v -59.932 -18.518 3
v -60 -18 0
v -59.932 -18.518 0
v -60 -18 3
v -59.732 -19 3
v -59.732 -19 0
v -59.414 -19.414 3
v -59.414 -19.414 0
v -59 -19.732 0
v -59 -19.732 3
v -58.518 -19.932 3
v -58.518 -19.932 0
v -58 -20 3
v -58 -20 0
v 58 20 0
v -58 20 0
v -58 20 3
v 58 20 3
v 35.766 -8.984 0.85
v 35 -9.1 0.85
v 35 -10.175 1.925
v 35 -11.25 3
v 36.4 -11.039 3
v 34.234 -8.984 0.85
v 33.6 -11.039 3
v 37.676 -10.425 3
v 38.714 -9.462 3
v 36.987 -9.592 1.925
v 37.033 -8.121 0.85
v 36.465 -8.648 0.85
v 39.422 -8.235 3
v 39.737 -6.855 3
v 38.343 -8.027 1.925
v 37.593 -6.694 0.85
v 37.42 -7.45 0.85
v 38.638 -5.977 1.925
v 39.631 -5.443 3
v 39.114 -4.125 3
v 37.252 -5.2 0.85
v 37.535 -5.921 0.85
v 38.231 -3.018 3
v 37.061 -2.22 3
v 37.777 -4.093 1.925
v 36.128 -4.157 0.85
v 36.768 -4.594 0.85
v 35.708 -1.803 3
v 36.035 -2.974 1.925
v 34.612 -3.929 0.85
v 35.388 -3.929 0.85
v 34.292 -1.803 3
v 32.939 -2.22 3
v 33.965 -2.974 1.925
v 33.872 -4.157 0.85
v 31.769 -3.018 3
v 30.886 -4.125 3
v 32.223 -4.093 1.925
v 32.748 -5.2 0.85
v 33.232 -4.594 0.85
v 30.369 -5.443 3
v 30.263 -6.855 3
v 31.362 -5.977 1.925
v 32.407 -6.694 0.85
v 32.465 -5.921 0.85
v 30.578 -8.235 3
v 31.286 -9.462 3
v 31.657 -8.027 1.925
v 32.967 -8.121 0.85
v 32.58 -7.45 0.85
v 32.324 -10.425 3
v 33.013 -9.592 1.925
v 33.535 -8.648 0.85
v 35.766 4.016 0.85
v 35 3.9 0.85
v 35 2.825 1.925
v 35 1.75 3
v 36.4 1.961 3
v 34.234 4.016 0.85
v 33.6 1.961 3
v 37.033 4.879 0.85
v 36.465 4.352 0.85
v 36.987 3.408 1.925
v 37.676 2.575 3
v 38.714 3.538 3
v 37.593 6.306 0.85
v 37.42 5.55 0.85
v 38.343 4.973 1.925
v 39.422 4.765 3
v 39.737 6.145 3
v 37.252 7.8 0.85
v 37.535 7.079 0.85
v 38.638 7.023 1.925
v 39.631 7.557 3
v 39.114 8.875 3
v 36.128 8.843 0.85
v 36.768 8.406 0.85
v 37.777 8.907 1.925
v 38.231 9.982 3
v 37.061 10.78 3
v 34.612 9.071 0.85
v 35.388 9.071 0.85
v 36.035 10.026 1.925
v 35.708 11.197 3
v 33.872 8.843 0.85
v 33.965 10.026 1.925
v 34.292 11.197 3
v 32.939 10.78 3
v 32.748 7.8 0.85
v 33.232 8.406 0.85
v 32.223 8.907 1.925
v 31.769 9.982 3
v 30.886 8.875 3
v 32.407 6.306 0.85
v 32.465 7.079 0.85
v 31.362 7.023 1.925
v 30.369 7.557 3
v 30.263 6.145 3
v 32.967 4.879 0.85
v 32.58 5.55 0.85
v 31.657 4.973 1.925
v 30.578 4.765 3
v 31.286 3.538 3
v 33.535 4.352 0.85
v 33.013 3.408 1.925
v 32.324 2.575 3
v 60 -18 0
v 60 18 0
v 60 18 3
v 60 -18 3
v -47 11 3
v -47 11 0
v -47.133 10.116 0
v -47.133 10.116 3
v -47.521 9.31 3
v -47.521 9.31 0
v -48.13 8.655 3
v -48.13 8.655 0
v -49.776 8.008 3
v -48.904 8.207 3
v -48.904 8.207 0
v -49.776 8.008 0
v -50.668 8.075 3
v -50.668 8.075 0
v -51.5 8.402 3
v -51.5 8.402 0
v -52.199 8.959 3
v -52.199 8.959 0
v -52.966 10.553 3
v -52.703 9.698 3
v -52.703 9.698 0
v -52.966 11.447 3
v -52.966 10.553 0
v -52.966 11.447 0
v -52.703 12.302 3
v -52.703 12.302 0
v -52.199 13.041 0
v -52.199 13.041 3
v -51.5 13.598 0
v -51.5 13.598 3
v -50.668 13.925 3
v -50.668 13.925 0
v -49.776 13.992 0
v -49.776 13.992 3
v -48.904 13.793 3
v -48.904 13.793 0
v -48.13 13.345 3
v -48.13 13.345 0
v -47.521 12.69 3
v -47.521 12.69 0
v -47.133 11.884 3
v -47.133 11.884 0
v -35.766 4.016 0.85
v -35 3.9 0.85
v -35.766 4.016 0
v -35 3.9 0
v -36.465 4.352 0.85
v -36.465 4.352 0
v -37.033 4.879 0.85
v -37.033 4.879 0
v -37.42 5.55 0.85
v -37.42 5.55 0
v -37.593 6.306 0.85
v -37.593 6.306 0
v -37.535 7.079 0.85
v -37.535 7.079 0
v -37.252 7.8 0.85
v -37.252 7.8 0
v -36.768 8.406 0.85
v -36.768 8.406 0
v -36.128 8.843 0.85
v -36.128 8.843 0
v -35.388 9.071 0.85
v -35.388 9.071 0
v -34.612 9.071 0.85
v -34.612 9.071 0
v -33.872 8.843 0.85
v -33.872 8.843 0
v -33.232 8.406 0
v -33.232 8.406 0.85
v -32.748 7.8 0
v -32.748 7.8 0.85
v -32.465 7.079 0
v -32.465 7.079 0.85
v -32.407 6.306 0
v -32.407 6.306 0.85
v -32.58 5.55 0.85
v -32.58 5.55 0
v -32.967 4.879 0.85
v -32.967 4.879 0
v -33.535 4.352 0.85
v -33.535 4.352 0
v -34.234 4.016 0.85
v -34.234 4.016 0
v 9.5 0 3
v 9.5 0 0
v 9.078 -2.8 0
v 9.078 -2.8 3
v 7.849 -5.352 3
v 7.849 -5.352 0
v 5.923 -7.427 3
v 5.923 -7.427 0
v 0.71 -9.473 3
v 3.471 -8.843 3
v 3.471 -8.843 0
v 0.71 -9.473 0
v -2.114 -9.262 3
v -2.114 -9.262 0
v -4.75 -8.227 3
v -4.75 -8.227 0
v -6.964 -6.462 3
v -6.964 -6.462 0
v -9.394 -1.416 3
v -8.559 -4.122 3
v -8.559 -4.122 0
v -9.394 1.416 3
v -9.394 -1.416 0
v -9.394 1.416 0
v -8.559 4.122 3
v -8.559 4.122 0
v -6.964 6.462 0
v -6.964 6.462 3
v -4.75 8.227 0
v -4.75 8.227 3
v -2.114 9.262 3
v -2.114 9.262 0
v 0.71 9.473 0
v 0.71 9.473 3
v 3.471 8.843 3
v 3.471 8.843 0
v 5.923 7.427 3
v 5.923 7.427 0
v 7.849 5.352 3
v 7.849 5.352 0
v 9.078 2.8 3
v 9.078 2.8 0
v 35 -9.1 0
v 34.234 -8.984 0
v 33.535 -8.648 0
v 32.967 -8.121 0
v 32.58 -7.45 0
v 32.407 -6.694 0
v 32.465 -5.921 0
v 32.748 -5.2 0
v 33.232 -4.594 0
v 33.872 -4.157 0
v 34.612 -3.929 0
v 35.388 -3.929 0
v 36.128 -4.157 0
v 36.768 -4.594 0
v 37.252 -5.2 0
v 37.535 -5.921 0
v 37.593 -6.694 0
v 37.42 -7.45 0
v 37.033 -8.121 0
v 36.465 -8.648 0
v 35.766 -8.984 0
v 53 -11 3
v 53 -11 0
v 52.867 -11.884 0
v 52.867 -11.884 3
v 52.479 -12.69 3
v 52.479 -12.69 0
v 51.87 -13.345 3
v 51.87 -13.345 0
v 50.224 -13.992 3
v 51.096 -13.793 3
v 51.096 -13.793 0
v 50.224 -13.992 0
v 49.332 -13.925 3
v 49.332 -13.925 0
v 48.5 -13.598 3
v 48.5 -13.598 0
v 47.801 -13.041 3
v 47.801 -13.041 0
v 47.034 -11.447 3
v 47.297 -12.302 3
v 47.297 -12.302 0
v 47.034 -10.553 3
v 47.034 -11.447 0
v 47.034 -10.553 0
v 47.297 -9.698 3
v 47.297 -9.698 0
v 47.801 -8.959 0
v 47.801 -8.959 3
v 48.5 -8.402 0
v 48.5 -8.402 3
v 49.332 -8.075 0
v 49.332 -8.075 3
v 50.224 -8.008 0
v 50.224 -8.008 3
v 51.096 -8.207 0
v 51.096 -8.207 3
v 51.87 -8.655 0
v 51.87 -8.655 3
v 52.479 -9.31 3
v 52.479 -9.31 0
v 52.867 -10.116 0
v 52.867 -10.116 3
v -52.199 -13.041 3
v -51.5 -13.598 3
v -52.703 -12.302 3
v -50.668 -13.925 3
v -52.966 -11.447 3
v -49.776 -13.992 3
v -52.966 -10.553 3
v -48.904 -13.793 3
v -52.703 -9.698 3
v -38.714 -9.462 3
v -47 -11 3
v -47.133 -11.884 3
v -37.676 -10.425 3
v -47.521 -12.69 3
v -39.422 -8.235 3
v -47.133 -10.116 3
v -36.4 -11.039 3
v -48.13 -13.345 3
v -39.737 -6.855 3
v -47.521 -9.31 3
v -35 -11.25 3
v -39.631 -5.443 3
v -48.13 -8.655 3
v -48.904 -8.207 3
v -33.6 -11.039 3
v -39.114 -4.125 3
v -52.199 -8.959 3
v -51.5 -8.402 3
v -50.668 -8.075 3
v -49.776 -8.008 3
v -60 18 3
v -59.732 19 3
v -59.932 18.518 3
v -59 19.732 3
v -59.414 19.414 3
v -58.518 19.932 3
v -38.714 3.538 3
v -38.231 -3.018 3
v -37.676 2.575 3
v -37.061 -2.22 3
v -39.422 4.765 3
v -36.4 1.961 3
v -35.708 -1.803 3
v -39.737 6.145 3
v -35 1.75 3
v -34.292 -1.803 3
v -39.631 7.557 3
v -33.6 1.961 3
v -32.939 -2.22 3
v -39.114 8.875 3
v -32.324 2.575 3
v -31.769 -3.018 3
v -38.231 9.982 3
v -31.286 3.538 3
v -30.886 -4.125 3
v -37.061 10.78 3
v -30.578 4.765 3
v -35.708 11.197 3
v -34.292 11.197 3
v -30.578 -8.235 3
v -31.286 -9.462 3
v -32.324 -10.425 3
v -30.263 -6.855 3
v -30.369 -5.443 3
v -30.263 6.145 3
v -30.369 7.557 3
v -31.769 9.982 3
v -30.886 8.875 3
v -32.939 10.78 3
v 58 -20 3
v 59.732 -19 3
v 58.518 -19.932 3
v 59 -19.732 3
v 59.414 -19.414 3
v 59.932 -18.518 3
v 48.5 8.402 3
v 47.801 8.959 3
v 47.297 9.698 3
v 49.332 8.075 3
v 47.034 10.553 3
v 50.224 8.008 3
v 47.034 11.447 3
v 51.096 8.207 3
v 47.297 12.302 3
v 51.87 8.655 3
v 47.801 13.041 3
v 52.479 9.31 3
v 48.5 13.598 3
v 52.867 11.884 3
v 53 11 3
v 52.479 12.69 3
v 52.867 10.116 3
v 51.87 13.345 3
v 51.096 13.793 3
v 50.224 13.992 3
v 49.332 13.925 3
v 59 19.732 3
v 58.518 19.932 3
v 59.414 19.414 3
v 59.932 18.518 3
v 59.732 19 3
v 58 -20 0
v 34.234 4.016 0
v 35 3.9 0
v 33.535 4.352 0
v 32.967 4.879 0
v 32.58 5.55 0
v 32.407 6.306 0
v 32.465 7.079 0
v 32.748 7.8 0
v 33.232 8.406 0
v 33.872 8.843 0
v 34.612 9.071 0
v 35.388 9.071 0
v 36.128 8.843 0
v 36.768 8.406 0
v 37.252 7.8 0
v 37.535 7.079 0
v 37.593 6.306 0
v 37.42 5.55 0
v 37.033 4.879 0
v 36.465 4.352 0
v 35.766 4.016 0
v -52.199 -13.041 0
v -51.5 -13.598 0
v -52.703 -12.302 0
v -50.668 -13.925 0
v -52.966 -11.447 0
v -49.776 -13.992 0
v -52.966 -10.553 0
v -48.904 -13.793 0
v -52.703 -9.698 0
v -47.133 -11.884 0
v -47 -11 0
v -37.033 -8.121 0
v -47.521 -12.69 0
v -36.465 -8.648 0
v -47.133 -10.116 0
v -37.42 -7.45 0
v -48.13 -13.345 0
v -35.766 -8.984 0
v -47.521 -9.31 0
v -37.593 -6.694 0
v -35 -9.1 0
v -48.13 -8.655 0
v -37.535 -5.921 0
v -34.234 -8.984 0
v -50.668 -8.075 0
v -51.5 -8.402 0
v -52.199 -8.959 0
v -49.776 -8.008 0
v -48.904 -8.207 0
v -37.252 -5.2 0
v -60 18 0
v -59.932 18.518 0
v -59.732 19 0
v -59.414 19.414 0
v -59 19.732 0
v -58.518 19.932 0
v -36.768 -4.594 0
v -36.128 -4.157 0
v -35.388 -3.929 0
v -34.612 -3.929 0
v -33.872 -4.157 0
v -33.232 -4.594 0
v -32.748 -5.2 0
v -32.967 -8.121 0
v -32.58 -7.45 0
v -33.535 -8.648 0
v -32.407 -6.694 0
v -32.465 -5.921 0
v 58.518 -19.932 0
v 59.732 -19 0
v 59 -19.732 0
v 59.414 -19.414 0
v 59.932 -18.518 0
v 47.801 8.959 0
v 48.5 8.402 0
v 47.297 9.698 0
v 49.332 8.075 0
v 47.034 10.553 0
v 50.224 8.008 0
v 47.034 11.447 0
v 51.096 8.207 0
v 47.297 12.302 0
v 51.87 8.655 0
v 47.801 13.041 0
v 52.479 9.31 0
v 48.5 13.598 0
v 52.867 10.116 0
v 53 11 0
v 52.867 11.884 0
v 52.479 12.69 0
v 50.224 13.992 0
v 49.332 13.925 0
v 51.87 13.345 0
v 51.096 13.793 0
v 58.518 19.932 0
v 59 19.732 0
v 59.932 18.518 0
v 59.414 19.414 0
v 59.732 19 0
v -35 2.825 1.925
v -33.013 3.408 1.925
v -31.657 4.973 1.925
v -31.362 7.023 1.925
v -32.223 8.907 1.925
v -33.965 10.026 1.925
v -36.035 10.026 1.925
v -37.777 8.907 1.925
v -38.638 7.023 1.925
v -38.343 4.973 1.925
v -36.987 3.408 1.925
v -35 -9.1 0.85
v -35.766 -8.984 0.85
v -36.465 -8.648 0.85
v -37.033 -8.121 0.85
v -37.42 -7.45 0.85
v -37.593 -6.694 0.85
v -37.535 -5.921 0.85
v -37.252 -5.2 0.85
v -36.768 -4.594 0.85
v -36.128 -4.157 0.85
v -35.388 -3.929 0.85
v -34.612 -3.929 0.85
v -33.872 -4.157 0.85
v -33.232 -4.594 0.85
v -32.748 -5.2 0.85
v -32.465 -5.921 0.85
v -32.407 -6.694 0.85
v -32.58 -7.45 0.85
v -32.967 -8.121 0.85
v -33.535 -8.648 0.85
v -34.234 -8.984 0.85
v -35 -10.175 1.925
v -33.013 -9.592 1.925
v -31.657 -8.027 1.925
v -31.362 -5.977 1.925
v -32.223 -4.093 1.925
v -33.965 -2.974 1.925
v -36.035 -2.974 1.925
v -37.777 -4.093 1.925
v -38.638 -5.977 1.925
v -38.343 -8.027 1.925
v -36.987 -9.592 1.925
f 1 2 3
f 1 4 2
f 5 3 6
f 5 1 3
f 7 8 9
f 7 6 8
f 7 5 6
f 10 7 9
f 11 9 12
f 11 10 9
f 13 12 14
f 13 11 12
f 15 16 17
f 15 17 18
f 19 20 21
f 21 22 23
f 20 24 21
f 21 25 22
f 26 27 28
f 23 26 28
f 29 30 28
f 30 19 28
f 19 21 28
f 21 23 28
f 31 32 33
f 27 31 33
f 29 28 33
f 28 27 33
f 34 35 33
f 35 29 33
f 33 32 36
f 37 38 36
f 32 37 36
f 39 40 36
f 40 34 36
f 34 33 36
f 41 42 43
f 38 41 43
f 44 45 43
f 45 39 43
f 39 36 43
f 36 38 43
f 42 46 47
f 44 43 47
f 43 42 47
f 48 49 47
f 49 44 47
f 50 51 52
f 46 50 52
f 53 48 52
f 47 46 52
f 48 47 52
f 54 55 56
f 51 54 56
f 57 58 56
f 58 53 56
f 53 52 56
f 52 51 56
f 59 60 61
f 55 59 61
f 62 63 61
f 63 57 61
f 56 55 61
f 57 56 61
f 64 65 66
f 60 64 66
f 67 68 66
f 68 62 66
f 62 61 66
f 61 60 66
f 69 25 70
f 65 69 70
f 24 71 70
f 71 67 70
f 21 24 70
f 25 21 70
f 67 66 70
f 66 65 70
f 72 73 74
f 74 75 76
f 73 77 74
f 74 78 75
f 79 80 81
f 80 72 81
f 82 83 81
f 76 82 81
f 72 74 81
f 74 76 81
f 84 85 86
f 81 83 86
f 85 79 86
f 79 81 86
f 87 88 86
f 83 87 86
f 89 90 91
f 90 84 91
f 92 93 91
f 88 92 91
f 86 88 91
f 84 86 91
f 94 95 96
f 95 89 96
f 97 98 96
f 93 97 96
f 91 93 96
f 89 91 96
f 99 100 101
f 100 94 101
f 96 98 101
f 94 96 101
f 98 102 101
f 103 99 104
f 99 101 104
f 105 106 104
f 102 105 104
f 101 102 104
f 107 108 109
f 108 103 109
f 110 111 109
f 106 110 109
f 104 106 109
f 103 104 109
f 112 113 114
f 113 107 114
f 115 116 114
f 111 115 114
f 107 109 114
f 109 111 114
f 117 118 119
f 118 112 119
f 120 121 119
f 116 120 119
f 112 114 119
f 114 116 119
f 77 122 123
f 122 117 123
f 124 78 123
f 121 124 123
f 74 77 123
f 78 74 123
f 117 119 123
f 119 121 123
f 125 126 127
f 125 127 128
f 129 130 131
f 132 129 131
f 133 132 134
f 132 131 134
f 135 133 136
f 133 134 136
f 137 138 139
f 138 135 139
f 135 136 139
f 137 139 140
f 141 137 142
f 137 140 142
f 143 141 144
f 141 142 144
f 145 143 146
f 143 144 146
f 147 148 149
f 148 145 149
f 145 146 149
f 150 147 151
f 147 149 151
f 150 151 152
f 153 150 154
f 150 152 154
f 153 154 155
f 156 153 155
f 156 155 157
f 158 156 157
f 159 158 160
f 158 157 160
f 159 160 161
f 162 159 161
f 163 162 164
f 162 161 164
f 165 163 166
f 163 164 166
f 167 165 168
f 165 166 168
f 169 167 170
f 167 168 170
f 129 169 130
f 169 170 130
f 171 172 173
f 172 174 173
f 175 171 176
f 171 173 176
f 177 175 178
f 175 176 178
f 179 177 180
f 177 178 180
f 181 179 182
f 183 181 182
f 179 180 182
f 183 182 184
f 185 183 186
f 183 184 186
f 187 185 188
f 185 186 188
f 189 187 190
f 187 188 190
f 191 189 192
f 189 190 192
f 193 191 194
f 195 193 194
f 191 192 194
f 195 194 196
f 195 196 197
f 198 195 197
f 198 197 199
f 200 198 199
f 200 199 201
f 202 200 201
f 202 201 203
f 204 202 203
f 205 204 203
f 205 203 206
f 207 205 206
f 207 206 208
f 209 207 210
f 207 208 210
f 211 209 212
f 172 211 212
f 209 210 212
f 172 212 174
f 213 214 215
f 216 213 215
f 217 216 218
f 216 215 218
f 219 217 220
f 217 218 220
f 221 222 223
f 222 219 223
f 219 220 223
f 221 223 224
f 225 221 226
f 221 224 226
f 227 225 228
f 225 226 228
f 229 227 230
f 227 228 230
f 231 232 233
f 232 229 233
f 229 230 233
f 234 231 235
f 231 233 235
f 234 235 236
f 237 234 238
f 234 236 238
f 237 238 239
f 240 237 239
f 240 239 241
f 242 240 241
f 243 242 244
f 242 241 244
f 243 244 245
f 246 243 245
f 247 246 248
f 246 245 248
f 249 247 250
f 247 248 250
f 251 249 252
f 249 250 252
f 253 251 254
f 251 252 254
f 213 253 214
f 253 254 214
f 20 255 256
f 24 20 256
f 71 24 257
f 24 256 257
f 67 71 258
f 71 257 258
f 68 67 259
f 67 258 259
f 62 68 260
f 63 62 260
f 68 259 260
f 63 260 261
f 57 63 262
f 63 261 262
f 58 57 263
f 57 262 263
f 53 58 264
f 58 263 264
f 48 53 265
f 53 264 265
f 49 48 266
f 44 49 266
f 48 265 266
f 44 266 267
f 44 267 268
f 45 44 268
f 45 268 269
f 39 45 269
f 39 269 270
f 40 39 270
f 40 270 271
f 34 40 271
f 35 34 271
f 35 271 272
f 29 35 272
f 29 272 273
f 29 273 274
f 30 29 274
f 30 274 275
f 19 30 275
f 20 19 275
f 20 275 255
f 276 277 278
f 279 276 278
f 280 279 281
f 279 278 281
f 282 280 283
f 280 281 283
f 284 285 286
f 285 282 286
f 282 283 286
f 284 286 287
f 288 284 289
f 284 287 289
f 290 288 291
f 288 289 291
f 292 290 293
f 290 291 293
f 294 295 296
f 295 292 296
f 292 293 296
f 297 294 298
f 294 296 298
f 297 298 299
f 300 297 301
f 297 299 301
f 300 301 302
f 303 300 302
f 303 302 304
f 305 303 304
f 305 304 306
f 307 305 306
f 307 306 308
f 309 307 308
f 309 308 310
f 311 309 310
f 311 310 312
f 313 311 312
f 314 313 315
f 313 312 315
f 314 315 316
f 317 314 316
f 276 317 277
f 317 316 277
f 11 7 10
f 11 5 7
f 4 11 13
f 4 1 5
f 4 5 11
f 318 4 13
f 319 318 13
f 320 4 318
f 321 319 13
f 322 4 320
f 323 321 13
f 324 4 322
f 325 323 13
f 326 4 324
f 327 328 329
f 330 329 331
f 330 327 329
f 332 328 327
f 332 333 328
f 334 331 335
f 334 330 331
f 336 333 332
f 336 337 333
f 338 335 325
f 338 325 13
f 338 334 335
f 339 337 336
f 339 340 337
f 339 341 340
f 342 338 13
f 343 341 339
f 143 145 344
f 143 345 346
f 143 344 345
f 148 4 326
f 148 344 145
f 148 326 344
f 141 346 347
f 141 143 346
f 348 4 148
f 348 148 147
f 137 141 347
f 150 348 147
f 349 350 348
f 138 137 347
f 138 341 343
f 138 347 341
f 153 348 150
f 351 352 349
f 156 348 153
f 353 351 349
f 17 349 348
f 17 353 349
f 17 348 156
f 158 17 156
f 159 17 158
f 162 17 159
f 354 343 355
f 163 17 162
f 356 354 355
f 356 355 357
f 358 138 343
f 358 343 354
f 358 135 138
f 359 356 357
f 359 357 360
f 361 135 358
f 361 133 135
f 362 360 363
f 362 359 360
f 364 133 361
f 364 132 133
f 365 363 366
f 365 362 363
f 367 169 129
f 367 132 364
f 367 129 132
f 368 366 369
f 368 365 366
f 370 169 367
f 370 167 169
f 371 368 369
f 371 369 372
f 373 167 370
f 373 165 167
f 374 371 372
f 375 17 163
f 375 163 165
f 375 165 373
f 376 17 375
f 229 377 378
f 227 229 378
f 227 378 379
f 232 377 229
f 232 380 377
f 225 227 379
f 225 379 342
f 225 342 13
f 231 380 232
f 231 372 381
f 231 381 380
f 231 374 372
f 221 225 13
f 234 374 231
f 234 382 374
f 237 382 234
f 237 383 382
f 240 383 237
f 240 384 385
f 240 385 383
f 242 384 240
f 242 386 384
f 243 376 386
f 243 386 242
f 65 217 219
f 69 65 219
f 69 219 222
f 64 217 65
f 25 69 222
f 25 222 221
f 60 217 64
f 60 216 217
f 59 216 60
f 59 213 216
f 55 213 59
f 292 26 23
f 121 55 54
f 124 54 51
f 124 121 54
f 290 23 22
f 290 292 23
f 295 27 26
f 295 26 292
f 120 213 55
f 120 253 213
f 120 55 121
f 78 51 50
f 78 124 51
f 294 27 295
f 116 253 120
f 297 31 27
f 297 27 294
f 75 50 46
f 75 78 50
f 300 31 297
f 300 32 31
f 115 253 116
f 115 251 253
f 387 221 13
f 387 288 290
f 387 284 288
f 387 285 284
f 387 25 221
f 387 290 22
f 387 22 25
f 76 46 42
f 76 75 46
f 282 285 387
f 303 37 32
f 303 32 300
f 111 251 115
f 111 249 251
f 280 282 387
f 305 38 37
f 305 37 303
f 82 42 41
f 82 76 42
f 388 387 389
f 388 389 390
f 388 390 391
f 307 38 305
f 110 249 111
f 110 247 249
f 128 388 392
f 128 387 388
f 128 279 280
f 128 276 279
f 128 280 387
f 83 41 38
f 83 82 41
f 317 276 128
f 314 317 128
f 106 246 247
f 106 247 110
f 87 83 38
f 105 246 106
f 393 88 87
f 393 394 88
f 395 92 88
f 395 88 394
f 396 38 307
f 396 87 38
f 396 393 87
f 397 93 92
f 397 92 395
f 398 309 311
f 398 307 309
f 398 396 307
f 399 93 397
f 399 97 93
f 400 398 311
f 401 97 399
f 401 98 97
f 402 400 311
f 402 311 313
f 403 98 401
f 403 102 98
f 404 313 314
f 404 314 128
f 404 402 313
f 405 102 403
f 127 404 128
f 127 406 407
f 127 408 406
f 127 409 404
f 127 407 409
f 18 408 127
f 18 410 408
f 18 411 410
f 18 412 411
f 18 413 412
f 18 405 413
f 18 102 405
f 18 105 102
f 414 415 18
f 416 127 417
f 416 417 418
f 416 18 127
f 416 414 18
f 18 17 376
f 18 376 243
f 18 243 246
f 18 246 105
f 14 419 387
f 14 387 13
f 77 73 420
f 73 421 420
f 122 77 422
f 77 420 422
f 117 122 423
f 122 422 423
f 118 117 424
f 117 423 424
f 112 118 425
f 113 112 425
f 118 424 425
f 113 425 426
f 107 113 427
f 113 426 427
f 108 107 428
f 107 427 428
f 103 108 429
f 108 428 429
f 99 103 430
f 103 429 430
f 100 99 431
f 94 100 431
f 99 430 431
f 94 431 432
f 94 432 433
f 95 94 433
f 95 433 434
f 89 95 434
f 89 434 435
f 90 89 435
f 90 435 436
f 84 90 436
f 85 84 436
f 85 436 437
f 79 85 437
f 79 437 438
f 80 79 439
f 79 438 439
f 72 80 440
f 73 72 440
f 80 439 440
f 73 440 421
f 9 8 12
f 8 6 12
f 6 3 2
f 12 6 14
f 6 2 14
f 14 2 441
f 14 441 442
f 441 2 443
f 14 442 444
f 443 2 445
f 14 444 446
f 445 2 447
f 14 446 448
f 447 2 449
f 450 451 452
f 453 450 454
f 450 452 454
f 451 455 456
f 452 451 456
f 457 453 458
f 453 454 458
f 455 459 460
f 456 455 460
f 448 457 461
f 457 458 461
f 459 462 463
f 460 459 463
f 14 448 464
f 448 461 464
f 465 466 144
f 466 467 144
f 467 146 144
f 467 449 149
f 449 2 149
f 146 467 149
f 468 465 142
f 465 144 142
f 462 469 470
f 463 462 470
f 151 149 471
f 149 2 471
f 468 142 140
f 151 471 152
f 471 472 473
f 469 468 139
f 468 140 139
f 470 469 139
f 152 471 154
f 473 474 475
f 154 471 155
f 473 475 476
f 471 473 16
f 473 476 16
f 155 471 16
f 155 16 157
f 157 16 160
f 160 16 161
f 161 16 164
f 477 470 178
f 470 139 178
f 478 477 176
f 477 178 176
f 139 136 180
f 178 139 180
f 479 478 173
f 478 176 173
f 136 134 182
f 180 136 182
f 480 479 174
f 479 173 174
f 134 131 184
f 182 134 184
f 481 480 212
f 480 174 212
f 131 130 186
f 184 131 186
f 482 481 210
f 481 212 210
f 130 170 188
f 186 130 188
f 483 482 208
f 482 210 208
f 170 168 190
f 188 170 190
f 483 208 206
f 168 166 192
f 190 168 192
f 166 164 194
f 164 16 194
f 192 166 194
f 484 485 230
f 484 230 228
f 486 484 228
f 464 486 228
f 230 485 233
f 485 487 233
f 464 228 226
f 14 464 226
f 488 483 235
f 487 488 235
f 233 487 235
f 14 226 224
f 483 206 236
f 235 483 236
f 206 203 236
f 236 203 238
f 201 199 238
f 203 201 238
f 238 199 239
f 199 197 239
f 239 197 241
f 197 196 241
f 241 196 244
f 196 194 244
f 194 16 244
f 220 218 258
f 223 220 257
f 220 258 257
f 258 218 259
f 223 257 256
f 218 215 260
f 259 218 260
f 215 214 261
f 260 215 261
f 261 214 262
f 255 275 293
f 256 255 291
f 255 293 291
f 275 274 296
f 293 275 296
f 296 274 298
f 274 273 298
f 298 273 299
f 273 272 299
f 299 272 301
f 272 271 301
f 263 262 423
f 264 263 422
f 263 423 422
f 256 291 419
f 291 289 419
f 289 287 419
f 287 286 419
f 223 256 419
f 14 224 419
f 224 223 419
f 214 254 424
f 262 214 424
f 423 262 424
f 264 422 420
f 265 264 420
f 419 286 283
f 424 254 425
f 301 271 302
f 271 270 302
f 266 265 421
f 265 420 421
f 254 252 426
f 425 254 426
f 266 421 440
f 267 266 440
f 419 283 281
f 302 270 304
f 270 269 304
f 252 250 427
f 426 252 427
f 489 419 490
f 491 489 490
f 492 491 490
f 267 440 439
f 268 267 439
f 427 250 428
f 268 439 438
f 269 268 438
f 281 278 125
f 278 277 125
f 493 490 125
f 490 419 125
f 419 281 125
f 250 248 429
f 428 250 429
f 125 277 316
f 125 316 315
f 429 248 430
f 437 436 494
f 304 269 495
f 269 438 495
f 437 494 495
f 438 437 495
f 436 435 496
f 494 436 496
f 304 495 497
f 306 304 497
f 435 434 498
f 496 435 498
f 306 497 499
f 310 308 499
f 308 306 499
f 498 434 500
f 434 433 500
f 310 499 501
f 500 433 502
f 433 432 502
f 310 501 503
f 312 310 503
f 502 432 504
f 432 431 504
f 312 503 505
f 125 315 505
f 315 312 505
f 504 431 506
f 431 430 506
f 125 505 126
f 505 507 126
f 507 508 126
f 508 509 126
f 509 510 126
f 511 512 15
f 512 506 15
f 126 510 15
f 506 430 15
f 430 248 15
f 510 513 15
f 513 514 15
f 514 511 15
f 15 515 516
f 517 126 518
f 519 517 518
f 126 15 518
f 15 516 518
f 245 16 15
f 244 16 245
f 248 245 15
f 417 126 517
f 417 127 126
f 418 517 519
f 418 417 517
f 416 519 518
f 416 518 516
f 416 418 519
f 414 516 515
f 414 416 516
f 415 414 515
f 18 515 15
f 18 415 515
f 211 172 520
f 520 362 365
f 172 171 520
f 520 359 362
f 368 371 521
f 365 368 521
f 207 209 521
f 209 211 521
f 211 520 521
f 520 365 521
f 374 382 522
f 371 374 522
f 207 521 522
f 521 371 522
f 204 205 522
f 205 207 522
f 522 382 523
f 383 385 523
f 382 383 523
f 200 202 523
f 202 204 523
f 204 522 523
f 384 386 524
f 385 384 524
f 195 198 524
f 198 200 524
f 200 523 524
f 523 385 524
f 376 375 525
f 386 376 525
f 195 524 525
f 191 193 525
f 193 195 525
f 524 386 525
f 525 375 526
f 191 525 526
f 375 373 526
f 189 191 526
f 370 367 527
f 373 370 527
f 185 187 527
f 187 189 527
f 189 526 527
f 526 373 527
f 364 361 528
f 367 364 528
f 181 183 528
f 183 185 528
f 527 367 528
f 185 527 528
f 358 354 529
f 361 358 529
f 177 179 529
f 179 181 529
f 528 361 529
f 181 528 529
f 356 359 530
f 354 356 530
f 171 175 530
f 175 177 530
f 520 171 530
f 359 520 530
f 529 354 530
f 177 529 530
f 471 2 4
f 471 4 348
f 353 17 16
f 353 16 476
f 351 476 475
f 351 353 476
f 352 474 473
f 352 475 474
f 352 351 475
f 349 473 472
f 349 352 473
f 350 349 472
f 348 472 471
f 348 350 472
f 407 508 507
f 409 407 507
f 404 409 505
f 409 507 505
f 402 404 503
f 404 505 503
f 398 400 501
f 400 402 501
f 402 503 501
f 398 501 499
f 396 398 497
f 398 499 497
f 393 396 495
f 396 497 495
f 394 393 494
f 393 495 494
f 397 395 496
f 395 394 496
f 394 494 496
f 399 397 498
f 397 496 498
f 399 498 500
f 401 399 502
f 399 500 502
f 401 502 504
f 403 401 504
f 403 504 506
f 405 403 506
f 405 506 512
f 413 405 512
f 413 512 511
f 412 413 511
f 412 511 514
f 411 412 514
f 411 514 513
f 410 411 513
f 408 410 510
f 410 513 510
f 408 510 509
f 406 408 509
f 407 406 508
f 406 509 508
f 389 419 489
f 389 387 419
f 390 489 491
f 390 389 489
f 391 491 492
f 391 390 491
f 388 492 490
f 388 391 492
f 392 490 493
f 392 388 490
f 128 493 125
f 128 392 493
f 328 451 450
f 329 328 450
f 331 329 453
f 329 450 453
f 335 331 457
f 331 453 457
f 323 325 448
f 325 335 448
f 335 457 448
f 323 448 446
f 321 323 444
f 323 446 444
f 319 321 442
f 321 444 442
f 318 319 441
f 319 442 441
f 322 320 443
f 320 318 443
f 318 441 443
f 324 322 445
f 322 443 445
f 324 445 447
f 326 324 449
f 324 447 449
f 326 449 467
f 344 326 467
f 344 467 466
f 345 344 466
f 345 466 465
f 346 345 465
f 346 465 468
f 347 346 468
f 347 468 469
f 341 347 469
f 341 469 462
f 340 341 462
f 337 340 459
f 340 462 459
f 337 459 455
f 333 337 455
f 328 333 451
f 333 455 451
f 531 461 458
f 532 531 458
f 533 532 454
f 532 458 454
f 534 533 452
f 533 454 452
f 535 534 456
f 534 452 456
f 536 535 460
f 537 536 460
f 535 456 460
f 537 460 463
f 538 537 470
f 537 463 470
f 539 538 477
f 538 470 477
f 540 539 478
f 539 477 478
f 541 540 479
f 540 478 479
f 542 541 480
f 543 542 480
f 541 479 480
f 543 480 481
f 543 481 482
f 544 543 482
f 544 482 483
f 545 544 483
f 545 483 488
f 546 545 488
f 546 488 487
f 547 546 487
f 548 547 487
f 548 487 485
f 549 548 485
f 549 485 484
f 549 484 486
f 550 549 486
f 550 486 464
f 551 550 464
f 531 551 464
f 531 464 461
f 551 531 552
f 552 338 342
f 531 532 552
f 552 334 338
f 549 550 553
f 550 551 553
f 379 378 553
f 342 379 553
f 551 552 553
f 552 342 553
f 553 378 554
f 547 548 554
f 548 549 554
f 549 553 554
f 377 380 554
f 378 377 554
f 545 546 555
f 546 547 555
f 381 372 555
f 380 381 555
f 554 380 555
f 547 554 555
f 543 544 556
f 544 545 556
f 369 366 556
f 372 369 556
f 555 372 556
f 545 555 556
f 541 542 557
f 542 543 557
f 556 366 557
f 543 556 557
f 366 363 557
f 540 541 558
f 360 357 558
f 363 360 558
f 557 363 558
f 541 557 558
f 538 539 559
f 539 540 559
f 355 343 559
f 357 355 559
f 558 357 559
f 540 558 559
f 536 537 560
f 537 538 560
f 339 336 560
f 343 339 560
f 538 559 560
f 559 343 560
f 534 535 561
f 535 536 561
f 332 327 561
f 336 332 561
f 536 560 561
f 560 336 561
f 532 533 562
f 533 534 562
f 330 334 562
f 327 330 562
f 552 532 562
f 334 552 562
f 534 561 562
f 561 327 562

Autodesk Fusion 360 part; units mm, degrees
sketch "Boceto1" plane through (0, 0, 0) normal (0, 0, 1) x (1, 0, 0)
  line L0 (60, -20) -> (-60, -20)
  line L1 (-60, -20) -> (-60, 20)
  line L2 (-60, 20) -> (60, 20)
  line L3 (60, 20) -> (60, -20)
  line L4 (60, -20) -> (-60, 20) construction
  line L5 (-60, -20) -> (60, 20) construction
  circle A0 centre (0, 0) radius 9.5
  circle A1 centre (-50, 11) radius 3
  circle A2 centre (50, 11) radius 3
  circle A3 centre (-50, -11) radius 3
  circle A4 centre (50, -11) radius 3
  dimension "d1" = 120
  dimension "d2" = 40
  dimension "d3" = 19
  dimension "d4" = 6
  dimension "d5" = 10
  dimension "d6" = 11
  dimension "d9" = 100
  dimension "d10" = -22
extrude "Extruir1" add sketch "Boceto1" along normal blind 3
sketch "Boceto2" plane through (0, 0, 3) normal (0, 0, 1) x (-1, 0, 0)
  circle A0 centre (0, 0) radius 9.5
  circle A1 centre (-50, -11) radius 3
  circle A2 centre (-50, 11) radius 3
  circle A3 centre (50, -11) radius 3
  circle A4 centre (50, 11) radius 3
  line L0 (-60, -20) -> (60, -20)
  line L1 (60, -20) -> (60, 20)
  line L2 (60, 20) -> (-60, 20)
  line L3 (-60, 20) -> (-60, -20)
  line L4 (35, -6.5) -> (-35, -6.5) construction
  line L5 (-35, -6.5) -> (-35, 6.5) construction
  line L6 (-35, 6.5) -> (35, 6.5) construction
  line L7 (35, 6.5) -> (35, -6.5) construction
  line L8 (35, -6.5) -> (-35, 6.5) construction
  line L9 (-35, -6.5) -> (35, 6.5) construction
  point P0 (35, -6.5)
  point P1 (35, 6.5)
  point P2 (-35, 6.5)
  point P3 (-35, -6.5)
  dimension "d18" = 13
  dimension "d19" = 25
hole "Agujero2" at (35, 6.5, 3) at (-35, 6.5, 3) at (-35, -6.5, 3) at (35, -6.5, 3) direction (0, 0, -1) diameter 5.2 depth 15 tip angle 180 countersink diameter 9.5 countersink angle 90
fillet "Empalme1" radius 2 4 edges at (-60, -20, 1.5) (-60, 20, 1.5) (60, -20, 1.5) (60, 20, 1.5)
